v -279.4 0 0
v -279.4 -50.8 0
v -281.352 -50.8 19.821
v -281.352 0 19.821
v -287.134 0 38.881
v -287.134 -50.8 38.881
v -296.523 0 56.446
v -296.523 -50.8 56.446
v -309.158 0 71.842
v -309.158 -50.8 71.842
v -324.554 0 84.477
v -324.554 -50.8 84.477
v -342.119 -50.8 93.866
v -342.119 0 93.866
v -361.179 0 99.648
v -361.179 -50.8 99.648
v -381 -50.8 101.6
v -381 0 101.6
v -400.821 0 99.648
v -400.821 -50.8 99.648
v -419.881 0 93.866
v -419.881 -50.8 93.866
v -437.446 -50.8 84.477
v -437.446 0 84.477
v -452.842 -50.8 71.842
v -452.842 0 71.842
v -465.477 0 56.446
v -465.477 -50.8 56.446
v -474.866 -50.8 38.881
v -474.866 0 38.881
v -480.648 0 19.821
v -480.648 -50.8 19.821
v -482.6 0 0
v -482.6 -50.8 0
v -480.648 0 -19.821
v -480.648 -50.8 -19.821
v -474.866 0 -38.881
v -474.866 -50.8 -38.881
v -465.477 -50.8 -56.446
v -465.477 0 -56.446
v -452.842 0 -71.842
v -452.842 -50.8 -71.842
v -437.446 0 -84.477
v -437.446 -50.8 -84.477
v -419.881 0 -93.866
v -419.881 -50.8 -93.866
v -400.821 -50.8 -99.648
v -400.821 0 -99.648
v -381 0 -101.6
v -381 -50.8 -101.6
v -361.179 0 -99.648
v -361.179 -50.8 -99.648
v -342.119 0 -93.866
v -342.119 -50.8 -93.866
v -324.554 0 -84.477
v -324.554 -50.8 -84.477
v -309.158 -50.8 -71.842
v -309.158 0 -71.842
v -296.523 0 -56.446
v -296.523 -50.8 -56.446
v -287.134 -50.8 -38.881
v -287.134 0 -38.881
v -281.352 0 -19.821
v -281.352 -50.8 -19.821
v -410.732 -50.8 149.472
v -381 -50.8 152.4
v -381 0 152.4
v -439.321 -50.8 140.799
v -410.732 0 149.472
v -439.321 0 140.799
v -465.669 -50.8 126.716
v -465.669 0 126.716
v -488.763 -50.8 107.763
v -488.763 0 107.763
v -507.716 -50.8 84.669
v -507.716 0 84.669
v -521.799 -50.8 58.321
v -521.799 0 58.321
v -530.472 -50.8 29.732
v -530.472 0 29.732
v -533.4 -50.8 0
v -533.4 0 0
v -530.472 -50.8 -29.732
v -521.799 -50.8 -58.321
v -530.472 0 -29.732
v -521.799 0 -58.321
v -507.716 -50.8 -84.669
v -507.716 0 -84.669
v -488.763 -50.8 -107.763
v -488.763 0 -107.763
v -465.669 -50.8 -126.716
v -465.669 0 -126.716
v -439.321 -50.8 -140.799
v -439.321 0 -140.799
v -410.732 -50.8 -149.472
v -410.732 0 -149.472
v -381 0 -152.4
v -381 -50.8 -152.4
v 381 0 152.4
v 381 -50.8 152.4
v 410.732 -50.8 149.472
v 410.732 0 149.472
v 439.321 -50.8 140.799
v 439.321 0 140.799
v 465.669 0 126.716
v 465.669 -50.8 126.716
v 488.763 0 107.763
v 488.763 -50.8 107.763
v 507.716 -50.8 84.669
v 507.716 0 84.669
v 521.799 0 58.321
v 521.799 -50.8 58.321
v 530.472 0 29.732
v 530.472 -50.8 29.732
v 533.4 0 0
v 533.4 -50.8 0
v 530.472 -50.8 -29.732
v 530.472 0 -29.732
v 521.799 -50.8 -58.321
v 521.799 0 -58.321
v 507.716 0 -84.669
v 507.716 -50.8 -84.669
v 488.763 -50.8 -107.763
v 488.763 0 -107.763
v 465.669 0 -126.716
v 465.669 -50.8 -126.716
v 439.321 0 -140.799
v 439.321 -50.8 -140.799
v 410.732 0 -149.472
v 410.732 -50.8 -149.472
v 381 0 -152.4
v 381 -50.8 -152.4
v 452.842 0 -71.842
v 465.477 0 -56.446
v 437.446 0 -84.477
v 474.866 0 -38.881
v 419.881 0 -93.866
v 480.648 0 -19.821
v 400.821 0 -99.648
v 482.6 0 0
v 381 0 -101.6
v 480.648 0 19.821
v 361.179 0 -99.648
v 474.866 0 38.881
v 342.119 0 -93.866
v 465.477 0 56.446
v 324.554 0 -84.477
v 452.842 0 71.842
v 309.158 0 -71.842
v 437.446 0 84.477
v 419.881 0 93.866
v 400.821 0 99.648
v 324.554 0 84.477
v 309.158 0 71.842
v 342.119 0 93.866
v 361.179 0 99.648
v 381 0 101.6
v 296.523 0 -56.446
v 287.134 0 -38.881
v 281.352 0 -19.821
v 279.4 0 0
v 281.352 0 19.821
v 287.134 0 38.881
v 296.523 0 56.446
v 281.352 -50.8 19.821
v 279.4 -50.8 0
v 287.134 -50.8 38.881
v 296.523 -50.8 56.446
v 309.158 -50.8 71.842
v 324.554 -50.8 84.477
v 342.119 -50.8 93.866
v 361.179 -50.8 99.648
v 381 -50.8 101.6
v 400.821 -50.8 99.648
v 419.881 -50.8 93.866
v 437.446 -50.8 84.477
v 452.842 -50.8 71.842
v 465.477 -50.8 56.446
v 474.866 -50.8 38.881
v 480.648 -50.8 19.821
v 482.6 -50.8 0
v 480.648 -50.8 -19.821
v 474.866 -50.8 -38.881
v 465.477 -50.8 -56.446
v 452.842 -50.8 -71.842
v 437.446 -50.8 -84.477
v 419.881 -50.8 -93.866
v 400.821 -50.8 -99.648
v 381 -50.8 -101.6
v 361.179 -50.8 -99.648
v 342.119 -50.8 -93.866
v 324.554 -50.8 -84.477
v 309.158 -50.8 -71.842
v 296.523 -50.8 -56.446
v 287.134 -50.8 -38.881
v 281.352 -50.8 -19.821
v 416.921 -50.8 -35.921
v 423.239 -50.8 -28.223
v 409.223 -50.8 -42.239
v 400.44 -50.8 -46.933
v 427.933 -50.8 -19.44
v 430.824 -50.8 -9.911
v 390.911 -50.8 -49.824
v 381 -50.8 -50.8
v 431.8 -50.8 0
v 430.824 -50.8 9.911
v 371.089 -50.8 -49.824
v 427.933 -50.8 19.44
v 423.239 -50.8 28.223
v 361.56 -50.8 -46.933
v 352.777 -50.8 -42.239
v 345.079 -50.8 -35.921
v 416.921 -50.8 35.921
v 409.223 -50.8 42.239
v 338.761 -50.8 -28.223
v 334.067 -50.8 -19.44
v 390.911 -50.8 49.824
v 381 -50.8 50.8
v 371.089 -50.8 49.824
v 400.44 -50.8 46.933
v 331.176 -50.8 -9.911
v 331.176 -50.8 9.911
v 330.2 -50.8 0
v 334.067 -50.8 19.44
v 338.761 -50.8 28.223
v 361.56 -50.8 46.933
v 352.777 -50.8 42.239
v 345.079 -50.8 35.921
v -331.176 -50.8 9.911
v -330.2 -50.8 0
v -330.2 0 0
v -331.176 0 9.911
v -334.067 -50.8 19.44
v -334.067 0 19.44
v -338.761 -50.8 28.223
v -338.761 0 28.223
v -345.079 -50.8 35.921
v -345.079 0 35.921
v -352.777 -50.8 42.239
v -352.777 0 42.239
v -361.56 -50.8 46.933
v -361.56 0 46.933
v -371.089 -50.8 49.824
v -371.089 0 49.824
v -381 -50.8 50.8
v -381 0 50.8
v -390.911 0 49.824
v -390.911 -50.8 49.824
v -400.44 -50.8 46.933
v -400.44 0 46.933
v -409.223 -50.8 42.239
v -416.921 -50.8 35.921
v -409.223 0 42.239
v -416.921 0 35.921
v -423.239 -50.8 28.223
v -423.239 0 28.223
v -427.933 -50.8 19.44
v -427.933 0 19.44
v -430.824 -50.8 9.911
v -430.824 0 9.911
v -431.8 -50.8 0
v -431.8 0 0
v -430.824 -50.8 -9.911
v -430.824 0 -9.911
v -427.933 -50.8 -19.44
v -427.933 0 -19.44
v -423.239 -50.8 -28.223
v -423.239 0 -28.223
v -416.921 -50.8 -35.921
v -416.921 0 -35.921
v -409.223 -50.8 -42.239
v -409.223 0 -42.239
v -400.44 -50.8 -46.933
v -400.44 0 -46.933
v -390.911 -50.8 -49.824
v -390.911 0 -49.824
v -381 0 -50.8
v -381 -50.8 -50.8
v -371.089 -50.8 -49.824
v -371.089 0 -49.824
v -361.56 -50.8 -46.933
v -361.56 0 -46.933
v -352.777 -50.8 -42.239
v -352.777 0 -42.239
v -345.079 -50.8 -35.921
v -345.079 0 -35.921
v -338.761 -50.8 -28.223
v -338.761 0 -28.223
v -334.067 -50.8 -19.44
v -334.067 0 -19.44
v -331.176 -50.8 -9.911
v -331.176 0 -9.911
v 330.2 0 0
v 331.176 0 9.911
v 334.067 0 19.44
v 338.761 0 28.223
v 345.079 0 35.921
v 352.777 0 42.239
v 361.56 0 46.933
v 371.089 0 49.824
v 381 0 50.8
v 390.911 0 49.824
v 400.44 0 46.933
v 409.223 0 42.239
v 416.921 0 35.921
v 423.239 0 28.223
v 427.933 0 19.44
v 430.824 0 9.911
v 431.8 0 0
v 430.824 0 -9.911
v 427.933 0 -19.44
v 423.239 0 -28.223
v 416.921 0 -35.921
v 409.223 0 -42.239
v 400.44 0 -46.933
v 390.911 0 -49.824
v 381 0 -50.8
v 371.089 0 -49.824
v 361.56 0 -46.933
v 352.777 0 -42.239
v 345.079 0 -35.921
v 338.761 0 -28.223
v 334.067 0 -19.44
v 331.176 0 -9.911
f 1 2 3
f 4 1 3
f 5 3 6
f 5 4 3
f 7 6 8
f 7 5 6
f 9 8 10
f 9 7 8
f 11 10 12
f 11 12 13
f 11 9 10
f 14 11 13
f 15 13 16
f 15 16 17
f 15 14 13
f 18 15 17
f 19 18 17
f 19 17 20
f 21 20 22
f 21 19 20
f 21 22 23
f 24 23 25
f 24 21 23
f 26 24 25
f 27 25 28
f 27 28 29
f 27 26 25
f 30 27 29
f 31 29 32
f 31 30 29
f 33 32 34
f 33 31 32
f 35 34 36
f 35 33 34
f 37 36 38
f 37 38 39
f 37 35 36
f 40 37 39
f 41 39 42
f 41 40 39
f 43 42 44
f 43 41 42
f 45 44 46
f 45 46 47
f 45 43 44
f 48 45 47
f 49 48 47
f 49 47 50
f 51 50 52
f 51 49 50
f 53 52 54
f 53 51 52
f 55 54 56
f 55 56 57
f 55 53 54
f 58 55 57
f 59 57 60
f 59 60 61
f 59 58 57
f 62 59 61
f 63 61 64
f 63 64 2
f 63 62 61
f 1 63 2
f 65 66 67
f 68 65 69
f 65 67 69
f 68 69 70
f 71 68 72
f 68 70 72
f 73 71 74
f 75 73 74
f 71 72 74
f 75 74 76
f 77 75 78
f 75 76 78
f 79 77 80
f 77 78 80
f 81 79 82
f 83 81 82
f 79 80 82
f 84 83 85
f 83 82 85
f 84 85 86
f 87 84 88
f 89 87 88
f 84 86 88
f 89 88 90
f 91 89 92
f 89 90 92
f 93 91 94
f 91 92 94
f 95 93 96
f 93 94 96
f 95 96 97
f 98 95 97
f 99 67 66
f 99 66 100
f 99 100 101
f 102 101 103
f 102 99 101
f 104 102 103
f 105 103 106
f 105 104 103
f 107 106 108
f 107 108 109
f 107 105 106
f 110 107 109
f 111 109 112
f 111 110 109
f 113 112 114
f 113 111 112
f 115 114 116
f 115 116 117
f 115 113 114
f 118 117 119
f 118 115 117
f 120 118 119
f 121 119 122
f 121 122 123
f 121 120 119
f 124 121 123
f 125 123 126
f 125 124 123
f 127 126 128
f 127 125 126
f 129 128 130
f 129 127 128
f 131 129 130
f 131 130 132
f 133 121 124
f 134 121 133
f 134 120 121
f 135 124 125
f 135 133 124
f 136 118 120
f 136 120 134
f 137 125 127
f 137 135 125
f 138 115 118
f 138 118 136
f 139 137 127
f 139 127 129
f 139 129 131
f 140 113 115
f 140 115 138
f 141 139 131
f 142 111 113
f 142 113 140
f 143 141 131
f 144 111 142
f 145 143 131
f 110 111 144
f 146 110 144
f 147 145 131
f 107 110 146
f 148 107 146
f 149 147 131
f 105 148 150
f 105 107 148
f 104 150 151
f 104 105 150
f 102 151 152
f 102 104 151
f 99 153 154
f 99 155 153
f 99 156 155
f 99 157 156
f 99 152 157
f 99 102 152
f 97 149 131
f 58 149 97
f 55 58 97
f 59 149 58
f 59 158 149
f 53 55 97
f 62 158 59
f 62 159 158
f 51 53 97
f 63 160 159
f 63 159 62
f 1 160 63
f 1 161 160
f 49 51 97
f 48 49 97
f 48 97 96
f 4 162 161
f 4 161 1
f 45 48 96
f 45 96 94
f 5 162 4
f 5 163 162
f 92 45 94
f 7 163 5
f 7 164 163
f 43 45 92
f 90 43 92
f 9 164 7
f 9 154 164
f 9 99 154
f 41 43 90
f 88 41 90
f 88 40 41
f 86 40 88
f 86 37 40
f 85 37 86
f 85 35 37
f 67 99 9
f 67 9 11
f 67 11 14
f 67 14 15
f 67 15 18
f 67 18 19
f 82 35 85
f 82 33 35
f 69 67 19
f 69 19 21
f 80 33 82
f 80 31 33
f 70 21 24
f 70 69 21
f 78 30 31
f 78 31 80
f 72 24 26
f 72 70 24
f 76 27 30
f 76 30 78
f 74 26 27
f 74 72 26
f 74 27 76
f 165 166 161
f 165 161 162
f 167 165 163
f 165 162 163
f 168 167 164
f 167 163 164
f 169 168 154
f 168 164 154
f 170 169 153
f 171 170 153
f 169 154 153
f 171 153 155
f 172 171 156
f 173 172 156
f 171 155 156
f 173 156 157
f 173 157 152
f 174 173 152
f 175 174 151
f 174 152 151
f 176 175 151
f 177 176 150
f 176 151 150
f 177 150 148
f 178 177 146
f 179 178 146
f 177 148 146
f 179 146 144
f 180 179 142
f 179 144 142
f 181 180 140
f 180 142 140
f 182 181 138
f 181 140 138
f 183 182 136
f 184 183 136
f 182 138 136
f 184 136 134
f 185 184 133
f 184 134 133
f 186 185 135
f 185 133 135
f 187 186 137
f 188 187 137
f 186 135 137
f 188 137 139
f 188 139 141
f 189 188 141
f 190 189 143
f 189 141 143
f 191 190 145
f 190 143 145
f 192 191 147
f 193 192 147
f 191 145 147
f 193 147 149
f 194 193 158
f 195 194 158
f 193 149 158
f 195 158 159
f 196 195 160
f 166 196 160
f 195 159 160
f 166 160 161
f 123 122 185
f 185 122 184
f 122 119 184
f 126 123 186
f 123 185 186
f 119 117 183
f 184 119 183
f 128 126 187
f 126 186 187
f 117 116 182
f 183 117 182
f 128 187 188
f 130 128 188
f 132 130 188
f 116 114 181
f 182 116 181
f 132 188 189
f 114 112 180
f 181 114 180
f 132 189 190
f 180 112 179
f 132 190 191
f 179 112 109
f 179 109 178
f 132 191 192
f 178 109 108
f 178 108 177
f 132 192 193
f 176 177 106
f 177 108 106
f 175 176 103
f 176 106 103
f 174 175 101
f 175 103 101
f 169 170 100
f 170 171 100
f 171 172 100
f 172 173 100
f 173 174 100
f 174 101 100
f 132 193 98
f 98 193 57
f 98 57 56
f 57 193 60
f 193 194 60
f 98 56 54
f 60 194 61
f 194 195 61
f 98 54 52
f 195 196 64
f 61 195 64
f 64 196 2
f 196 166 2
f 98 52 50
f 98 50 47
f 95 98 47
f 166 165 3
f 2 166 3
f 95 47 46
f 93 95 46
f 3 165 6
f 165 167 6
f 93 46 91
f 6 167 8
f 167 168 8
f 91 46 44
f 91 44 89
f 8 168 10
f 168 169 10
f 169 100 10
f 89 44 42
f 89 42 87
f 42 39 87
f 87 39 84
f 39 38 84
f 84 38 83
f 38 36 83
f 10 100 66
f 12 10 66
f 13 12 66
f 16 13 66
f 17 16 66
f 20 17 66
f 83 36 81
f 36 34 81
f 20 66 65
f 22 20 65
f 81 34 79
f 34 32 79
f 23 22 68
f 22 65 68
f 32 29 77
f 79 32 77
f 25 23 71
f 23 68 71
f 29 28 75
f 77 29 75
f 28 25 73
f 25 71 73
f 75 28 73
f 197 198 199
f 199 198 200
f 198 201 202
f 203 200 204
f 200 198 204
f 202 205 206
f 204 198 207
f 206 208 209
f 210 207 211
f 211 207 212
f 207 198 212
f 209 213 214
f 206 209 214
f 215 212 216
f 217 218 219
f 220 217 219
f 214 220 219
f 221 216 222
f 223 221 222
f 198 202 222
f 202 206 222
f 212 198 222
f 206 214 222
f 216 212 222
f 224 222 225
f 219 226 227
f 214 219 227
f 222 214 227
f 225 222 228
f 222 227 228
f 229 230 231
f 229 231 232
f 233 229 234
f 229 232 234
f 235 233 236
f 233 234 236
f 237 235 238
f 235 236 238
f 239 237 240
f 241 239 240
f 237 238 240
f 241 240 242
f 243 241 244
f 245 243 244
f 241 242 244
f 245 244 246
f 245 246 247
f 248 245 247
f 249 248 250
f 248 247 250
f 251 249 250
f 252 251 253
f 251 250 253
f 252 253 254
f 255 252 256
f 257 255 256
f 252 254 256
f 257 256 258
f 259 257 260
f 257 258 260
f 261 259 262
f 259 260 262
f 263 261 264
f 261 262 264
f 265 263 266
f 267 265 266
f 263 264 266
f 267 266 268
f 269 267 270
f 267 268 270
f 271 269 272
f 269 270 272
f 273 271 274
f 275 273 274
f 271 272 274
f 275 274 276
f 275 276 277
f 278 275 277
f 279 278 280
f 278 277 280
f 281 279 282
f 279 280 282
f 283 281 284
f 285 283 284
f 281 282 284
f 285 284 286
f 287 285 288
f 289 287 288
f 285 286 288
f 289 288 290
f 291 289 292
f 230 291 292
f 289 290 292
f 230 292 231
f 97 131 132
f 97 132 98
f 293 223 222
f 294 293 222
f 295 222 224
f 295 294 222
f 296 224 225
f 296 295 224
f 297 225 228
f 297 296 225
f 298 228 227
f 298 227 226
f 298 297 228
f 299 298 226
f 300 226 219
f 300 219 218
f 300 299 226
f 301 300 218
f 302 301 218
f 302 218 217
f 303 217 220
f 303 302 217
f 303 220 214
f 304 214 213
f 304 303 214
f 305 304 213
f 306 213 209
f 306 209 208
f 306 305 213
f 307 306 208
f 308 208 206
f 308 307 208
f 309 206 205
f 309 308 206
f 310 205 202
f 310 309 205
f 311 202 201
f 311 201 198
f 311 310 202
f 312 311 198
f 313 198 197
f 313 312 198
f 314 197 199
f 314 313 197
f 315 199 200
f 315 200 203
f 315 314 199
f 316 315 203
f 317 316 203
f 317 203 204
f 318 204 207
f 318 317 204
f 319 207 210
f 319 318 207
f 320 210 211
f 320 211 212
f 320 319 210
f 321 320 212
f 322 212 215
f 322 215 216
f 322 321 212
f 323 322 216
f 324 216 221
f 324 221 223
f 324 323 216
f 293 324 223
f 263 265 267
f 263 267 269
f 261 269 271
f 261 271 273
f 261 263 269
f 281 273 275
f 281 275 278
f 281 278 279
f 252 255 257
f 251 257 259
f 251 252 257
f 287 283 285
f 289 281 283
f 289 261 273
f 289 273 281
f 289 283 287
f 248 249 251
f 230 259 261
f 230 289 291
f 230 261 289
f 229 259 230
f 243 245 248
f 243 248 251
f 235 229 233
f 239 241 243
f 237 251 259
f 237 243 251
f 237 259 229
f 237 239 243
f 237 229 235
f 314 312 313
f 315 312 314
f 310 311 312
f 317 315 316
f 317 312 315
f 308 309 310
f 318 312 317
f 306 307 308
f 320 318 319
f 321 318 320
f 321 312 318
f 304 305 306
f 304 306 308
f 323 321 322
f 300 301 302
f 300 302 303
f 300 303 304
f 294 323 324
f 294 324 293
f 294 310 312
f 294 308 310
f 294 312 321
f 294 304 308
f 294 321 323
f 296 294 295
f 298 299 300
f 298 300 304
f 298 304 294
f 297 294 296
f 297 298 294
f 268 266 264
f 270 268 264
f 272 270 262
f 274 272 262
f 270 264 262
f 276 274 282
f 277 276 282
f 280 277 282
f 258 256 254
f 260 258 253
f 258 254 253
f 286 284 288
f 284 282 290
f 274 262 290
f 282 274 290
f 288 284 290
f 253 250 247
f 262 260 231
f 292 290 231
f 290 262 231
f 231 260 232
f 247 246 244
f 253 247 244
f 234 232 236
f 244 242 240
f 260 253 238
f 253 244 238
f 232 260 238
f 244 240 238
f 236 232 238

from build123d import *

# Parameters (mm, degrees)
F0_R     = 50.8
F1_DEPTH = 50.8
F0_R_2   = 101.6


with BuildPart() as f1:
    # F0 (on Front) → F1 (new body)
    with BuildSketch(Plane.XZ):
        with Locations((-381, 0)):
            Circle(F0_R)
    extrude(amount=F1_DEPTH)


with BuildPart() as f1b:
    # F0 (on Front) → F1, piece 2 (new body)
    with BuildSketch(Plane.XZ):
        with BuildLine():
            ThreePointArc((-381, -152.4), (-273.2369265472, -107.7630734528), (-228.6, 0))
            ThreePointArc((-228.6, 0), (-273.2369265472, 107.7630734528), (-381, 152.4))
            ThreePointArc((-381, 152.4), (-533.4, 0), (-381, -152.4))
        make_face()
        with Locations((-381, 0)):
            Circle(F0_R_2, mode=Mode.SUBTRACT)
        with BuildLine():
            ThreePointArc((-381, 152.4), (-273.2369265472, 107.7630734528), (-228.6, 0))
            ThreePointArc((-228.6, 0), (-273.2369265472, -107.7630734528), (-381, -152.4))
            Line((-381, -152.4), (0, -152.4))
            Line((0, -152.4), (0, 152.4))
            Line((0, 152.4), (-381, 152.4))
        make_face()
    extrude(amount=F1_DEPTH)

    # F2: F1b, F1 across face


with BuildPart() as f1b_1:
    add(f1b.part)
    add(f1b.part.mirror(Plane(origin=(0, -25.4, 0), x_dir=(0, 1, 0), z_dir=(1, 0, 0))))
    add(f1.part.mirror(Plane(origin=(0, -25.4, 0), x_dir=(0, 1, 0), z_dir=(1, 0, 0))))


solid = Compound([f1.part, f1b_1.part])
